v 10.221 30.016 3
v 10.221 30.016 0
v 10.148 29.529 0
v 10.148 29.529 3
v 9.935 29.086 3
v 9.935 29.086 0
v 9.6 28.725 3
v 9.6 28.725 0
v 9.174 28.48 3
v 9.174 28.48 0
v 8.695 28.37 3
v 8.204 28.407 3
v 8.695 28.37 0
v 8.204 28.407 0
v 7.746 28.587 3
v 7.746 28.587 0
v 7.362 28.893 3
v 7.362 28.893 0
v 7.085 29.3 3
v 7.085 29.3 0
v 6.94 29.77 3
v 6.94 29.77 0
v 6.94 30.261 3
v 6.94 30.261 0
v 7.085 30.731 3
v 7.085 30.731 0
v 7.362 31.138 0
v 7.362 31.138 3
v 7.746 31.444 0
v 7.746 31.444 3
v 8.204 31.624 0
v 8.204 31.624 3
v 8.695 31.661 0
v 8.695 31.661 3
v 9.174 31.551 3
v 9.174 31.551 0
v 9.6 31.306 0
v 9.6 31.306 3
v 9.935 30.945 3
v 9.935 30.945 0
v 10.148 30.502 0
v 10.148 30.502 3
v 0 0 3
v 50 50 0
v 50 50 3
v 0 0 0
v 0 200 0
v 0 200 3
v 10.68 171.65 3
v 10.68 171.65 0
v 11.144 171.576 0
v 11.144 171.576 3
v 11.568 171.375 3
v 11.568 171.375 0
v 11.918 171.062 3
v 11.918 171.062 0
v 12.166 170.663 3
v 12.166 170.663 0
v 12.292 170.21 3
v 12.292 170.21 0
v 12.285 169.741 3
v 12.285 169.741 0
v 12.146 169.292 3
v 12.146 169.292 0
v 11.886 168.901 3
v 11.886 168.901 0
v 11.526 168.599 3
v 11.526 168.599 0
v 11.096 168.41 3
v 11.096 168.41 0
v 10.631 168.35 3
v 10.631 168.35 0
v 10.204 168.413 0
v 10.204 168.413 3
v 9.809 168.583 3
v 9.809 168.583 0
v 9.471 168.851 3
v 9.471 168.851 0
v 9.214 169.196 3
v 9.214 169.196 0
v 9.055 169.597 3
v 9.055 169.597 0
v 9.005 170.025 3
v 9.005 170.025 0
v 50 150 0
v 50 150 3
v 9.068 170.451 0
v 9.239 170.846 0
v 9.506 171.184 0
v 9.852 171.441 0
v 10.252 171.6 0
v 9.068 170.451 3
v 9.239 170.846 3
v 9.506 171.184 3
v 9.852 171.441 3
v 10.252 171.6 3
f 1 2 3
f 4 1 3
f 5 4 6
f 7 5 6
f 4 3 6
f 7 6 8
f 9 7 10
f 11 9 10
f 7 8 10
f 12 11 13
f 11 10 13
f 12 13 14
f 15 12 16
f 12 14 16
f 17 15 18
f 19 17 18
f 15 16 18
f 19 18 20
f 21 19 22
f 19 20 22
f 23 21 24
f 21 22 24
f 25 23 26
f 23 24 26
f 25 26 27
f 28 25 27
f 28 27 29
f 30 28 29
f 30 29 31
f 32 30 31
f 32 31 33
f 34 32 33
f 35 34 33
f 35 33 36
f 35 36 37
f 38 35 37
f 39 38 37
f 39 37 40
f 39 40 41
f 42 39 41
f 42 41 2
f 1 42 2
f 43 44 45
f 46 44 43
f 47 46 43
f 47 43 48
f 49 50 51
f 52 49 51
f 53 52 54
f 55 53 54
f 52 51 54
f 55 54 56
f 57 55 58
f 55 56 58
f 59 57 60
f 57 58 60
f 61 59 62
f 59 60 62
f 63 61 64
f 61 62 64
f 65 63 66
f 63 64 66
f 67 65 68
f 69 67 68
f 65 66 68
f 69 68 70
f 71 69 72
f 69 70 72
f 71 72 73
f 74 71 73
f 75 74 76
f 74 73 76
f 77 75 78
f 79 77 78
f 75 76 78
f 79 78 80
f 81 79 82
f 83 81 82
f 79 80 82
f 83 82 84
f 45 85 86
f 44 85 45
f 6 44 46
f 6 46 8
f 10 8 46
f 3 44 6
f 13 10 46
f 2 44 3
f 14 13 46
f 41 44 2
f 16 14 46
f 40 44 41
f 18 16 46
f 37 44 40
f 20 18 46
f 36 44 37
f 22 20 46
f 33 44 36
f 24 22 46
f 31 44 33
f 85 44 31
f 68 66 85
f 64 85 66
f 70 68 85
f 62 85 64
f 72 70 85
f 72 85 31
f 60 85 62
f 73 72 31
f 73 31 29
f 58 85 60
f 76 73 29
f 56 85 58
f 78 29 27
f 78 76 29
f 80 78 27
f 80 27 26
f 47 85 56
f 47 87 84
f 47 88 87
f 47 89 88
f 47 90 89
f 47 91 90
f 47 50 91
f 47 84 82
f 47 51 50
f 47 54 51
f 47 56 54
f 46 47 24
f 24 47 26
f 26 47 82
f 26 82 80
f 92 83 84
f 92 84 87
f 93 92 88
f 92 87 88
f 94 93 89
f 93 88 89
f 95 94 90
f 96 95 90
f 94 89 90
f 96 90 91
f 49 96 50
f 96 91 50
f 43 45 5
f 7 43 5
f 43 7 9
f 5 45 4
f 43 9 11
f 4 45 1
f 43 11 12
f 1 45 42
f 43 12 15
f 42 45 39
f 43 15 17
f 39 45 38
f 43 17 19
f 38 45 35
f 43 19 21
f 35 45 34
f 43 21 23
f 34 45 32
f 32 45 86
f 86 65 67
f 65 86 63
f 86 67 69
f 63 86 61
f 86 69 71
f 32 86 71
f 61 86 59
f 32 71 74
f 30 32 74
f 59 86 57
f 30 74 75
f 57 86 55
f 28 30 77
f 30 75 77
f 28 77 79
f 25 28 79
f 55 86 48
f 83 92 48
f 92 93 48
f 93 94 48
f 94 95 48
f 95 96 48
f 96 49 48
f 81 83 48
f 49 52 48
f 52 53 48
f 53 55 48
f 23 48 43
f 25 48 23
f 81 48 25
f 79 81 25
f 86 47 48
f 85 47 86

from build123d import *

# Parameters (mm, degrees)
EXTRUDE_1_DEPTH     = 3
SKETCH_5_R          = 1.65
CUT_EXTRUDE_1_DEPTH = 8


with BuildPart() as part:
    # Эскиз1 → Бобышка-Вытянуть1 (new body)
    with BuildSketch(Plane.XY):
        Polygon((0, 0), (0, 200), (50, 150), (50, 50), align=None)
    extrude(amount=EXTRUDE_1_DEPTH)

    # Эскиз5 → Вырез-Вытянуть1 (cut)
    with BuildSketch(Plane(origin=(-305.961161651, -184.204468703, -1.5), x_dir=(-0.9998892265297747, 0.01488404077153568, 0), z_dir=(0, 0, -1))):
        with BuildLine():
            ThreePointArc((-309.659295343, 358.877763083), (-310.142569154, 360.044489272), (-311.309295343, 360.527763083))
            Line((-311.309295343, 360.527763083), (-311.309295343, 357.227763083))
            ThreePointArc((-311.309295343, 357.227763083), (-310.142569154, 357.711036894), (-309.659295343, 358.877763083))
        make_face()
        with BuildLine():
            Line((-311.309295343, 357.227763083), (-311.309295343, 360.527763083))
            ThreePointArc((-311.309295343, 360.527763083), (-312.959295343, 358.877763083), (-311.309295343, 357.227763083))
        make_face()
        with Locations(Location((-311.309295343, 218.877763083, 0), (0, 0, 179.147175791))):
            Circle(SKETCH_5_R)
    extrude(amount=-CUT_EXTRUDE_1_DEPTH, mode=Mode.SUBTRACT)


solid = part.part
